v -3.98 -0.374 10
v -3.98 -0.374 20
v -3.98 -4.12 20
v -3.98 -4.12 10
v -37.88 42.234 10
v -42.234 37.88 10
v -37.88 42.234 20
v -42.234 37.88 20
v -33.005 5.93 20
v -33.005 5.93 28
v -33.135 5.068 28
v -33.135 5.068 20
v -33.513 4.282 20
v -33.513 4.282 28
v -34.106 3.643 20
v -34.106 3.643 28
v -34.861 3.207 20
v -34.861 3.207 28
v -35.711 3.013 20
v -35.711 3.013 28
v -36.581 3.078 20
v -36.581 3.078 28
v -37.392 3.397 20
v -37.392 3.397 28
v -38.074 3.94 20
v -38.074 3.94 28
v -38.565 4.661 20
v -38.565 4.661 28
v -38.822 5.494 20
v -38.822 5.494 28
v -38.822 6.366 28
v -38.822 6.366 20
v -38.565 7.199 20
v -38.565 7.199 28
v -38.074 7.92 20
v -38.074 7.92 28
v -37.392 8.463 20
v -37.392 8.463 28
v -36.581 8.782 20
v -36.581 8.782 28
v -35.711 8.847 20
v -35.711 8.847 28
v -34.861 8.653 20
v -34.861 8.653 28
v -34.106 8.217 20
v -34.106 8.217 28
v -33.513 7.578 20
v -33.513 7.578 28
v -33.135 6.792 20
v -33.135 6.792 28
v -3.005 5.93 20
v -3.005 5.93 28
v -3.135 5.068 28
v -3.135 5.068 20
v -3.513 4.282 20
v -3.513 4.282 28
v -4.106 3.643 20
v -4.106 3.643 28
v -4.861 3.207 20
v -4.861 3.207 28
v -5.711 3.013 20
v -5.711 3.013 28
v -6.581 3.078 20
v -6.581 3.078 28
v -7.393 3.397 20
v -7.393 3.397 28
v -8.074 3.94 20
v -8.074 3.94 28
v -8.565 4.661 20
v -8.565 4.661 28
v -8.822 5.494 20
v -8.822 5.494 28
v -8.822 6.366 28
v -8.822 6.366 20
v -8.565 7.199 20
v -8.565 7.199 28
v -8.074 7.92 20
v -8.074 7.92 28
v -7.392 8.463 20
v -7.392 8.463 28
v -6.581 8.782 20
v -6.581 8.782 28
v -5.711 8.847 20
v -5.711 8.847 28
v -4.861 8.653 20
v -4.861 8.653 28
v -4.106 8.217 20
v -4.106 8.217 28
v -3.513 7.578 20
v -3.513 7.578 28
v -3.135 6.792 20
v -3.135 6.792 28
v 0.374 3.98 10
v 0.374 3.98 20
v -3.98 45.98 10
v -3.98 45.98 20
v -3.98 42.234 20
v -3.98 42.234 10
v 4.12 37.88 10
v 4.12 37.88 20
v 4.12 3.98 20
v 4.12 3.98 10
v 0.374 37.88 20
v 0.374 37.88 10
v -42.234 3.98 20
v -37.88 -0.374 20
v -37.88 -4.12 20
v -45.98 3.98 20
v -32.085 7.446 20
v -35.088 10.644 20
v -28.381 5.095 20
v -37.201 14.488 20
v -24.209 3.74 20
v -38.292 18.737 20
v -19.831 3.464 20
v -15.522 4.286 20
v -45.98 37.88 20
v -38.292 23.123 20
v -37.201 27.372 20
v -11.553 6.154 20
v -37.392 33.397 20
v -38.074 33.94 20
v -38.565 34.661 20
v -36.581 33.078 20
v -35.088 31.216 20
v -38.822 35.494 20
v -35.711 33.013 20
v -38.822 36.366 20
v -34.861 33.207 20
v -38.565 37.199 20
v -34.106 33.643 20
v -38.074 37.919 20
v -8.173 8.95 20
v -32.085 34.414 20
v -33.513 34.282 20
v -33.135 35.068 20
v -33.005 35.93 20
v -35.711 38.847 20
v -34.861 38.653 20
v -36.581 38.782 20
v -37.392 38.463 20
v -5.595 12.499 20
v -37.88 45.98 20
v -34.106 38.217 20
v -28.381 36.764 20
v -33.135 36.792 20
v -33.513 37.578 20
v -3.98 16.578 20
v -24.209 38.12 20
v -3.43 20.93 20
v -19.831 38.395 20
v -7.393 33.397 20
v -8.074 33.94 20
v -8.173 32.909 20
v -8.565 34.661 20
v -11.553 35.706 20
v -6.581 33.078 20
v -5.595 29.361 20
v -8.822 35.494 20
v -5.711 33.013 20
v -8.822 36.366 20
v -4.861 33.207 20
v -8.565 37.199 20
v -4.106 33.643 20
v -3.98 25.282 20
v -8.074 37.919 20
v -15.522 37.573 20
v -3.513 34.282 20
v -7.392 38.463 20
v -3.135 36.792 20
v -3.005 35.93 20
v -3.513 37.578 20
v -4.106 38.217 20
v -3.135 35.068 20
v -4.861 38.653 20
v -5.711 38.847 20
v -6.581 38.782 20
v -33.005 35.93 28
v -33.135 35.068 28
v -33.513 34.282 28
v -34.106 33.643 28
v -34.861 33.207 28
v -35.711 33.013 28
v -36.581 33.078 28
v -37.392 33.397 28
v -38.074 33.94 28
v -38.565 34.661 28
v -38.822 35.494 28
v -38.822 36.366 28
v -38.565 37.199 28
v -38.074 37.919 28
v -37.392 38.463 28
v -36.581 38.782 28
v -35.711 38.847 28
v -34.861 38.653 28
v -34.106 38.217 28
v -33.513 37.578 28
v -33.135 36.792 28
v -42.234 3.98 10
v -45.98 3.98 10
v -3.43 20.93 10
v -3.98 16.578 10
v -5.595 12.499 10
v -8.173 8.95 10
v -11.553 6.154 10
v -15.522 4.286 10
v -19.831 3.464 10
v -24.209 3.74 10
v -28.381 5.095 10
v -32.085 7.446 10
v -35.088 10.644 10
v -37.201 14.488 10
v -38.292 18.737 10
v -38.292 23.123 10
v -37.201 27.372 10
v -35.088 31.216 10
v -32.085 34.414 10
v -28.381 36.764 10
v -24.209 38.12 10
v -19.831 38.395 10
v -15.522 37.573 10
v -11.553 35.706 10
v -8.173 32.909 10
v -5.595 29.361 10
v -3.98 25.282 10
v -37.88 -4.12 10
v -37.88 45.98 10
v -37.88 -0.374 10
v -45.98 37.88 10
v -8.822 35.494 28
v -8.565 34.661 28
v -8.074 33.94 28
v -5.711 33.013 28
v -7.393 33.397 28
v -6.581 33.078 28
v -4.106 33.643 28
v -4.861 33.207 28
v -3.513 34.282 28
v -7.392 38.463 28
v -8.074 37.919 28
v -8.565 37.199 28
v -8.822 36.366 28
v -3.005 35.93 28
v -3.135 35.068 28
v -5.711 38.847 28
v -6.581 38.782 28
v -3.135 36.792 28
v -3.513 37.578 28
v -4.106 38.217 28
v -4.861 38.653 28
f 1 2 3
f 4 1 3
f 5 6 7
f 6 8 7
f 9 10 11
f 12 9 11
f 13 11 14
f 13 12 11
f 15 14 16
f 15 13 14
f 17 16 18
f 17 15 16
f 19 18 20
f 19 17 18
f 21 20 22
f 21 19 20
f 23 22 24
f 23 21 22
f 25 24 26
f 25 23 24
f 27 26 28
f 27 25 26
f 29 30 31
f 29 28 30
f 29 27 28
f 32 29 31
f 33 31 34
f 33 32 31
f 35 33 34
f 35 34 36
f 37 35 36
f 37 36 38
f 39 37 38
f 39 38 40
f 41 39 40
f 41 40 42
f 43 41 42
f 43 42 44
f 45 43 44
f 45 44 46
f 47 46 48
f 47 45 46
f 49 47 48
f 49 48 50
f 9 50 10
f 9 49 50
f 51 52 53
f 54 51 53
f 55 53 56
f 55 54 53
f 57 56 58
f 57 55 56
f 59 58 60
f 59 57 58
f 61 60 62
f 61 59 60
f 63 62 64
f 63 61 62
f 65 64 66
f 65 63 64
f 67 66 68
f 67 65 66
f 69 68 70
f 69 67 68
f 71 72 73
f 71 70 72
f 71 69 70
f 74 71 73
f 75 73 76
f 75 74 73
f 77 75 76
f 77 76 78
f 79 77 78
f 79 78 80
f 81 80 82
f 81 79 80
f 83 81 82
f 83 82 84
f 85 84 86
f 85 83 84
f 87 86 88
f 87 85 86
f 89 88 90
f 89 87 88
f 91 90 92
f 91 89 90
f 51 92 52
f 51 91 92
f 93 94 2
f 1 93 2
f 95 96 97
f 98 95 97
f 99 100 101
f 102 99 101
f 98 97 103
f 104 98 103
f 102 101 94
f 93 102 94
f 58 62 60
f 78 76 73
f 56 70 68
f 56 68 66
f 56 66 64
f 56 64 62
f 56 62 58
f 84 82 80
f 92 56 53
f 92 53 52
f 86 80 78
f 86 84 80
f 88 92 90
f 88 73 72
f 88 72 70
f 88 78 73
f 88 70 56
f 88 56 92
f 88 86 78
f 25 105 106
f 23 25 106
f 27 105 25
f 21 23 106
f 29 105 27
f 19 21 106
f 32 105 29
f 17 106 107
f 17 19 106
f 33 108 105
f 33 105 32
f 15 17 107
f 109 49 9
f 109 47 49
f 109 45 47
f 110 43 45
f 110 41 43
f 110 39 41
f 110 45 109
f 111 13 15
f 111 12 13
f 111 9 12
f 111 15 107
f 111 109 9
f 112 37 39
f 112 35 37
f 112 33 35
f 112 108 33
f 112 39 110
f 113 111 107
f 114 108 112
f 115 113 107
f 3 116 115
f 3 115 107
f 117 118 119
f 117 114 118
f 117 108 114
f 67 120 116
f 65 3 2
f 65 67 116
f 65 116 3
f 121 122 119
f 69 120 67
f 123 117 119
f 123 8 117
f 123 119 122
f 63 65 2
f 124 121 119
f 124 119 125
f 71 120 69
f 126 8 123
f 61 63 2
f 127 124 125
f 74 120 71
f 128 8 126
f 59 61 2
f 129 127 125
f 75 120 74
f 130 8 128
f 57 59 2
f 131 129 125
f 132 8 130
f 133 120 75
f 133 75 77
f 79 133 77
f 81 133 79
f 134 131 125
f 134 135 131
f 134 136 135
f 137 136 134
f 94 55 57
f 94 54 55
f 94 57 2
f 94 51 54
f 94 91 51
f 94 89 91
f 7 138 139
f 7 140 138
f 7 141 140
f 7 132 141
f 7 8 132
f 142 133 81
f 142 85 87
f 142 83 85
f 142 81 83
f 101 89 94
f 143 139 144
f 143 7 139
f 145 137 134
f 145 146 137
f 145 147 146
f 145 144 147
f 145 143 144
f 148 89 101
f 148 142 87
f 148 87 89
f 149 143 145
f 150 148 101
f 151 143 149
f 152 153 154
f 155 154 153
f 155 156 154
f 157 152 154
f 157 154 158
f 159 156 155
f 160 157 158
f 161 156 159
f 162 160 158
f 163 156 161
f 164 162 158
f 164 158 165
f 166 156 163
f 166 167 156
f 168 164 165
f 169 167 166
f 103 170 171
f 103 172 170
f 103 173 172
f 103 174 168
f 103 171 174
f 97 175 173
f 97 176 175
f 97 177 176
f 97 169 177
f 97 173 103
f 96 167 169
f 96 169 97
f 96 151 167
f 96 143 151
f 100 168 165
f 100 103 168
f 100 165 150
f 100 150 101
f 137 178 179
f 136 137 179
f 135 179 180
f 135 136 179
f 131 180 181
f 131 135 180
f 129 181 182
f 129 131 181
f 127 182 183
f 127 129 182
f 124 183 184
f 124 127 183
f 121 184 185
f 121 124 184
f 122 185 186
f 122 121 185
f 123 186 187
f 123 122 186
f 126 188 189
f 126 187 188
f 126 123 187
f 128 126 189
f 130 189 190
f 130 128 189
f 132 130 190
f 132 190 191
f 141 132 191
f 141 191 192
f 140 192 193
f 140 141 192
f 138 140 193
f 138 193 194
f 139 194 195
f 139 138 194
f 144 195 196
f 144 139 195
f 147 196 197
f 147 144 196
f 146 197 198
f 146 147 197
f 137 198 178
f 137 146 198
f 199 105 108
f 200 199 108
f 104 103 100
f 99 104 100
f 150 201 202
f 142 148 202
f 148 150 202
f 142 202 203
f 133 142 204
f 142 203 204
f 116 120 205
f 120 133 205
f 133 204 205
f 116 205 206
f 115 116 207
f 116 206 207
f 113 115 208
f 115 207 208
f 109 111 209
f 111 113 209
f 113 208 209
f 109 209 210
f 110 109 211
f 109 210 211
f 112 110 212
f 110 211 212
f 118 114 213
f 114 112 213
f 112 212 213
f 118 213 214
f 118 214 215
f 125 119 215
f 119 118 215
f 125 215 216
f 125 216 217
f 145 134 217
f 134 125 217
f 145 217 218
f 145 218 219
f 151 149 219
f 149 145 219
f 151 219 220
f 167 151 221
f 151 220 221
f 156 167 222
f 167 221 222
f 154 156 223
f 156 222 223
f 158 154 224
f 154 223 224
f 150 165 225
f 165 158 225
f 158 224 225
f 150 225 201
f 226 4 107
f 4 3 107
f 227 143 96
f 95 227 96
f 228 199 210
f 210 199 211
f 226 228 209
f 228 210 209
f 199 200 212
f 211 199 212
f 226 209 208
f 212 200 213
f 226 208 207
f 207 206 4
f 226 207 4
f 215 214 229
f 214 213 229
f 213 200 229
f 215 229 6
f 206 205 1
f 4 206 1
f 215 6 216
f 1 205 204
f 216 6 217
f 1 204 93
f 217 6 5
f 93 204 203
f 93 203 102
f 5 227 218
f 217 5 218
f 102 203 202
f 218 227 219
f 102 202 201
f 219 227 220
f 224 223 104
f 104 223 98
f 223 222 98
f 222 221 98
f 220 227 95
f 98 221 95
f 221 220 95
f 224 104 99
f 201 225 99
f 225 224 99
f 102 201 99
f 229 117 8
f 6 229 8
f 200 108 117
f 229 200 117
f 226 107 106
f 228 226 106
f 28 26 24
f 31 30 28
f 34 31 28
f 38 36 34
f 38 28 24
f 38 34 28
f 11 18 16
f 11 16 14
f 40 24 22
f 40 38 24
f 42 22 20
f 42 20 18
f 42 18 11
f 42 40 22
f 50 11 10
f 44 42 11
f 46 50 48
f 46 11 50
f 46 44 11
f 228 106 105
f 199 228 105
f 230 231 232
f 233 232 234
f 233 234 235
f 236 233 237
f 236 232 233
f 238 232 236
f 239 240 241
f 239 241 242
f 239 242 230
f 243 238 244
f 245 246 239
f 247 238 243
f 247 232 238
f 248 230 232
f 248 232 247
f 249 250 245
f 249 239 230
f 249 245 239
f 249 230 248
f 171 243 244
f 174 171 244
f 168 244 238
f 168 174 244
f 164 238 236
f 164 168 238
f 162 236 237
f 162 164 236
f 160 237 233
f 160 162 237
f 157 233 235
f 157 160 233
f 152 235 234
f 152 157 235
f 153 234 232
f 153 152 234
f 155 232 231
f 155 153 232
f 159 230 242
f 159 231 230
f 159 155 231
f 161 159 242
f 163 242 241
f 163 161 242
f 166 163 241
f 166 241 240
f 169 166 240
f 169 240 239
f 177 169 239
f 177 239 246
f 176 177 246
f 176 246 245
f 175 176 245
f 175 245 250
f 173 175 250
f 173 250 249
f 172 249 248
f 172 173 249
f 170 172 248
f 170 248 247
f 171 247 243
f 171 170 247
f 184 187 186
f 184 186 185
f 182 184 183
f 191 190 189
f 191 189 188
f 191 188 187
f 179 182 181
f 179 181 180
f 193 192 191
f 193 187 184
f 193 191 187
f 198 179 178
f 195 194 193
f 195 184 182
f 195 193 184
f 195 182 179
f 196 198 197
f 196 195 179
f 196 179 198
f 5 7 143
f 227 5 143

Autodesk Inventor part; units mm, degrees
ref_plane "YZ Plane" through (0, 0, 0) normal (1, 0, 0) x (0, 1, 0)
ref_plane "XZ Plane" through (0, 0, 0) normal (0, 1, 0) x (-1, 0, 0)
ref_plane "Work Plane1" through (0, 0, 10) normal (0, 0, 1) x (1, 0, 0)
sketch "Sketch1" plane through (0, 0, 10) normal (0, 0, 1) x (1, 0, 0)
  line L0 (-4.0299, -0.3538) -> (-2.2322, 1.4439) construction
  arc A0 (-1.4439, 2.2322) -> (-2.2322, 1.4439) centre (-0.9299, 0.9299) ccw construction
  line L1 (-1.4439, 2.2322) -> (0.3538, 4.0299) construction
  line L2 (-37.8299, 42.8299) -> (-37.8299, 37.8299) construction
  line L3 (-37.8299, 37.8299) -> (-42.9208, 37.8299) construction
  line L4 (-37.8299, 42.2137) -> (-37.8299, 45.8299) construction
  line L5 (-37.8299, 45.8299) -> (-4.0299, 45.8299) construction
  line L6 (-4.0299, 45.8299) -> (-4.0299, 42.2137) construction
  line L7 (-4.0299, 4.0299) -> (0.3538, 4.0299) projected
  circle A1 centre (-20.9299, 20.9299) radius 17.5 projected
  line L8 (-20.9299, 58.9723) -> (17.1124, 20.9299) construction
  line L9 (17.1124, 20.9299) -> (-20.9299, -17.1124) construction
  line L10 (-20.9299, -17.1124) -> (-58.9723, 20.9299) construction
  line L11 (-58.9723, 20.9299) -> (-20.9299, 58.9723) construction
  line L12 (-20.9299, 58.9723) -> (-20.9299, -17.1124) construction
  line L13 (17.1124, 20.9299) -> (-58.9723, 20.9299) construction
  line L14 (-20.9299, 58.9723) -> (32.8701, 58.9723) construction
  line L15 (-43.4299, 43.4299) -> (1.5701, 43.4299) construction
  line L16 (1.5701, 43.4299) -> (1.5701, -1.5701) construction
  line L17 (1.5701, -1.5701) -> (-43.4299, -1.5701) construction
  line L18 (-43.4299, -1.5701) -> (-43.4299, 43.4299) construction
  line L19 (-43.4299, 43.4299) -> (1.5701, -1.5701) construction
  line L20 (1.5701, 43.4299) -> (-43.4299, -1.5701) construction
  line L21 (-43.4299, 5.3876) -> (-43.4299, 36.4723)
  line L22 (-43.4299, 36.4723) -> (-36.4723, 43.4299)
  line L23 (-36.4723, 43.4299) -> (-5.3876, 43.4299)
  line L24 (-5.3876, 43.4299) -> (1.5701, 36.4723)
  line L25 (1.5701, 36.4723) -> (1.5701, 5.3876)
  line L26 (1.5701, 5.3876) -> (-5.3876, -1.5701)
  line L27 (-5.3876, -1.5701) -> (-36.4723, -1.5701)
  line L28 (-36.4723, -1.5701) -> (-43.4299, 5.3876)
  line L29 (-4.0299, 42.2137) -> (-37.8299, 42.2137) projected
  line L30 (-4.0299, -0.3538) -> (-4.0299, 4.0299) projected
  point P0 (-37.8299, 4.0299)
  point P1 (-20.9299, 20.9299)
  dimension "d18" = 53.8
  dimension "d19" = 45
  dimension "d20" = 53.8
  dimension "d21" = 45
  dimension "d22" = 45
extrude "Extrusion1" add sketch "Sketch1" along normal blind 10
sketch "Sketch2" plane through (0, 0, 20) normal (0, 0, 1) x (1, 0, 0)
  circle A0 centre (-35.9299, 35.9299) radius 3.0099 construction
  circle A1 centre (-5.93, 35.9299) radius 3.0099 construction
  circle A2 centre (-5.93, 5.93) radius 3.0099 construction
  circle A3 centre (-35.9299, 5.93) radius 3.0099 construction
  circle A4 centre (-35.9299, 35.9299) radius 2.925
  circle A5 centre (-5.93, 35.9299) radius 2.925
  circle A6 centre (-5.93, 5.93) radius 2.925
  circle A7 centre (-35.9299, 5.93) radius 2.925
  point P0 (0, 0)
  dimension "d1" = 5.85
  dimension "d31" = 5.85
  dimension "d32" = 5.85
  dimension "d33" = 5.85
ref_plane "Work Plane2" through (-40.9959, 0.8639, 22.2359) normal (0, 0, 1) x (1, 0, 0)
extrude "Extrusion2" add sketch "Sketch2" along normal blind 8
sketch "Sketch3" plane through (0, 0, 10) normal (0, 0, -1) x (-1, 0, 0)
  line L0 (37.8299, -0.4701) -> (37.8299, 4.0299) construction
  line L1 (4.0299, 4.0299) -> (4.0299, -0.4701) construction
  line L2 (37.8299, -0.4701) -> (37.8299, 1.1886) construction
  line L3 (4.0299, -3.9701) -> (4.0299, -0.3538) construction
  line L4 (45.8299, 4.0299) -> (42.2137, 4.0299) construction
  line L5 (-0.3538, 4.0299) -> (-3.9701, 4.0299) construction
  line L6 (-3.9701, 37.8299) -> (-0.3538, 37.8299) construction
  line L7 (4.0299, 42.2137) -> (4.0299, 45.8299) construction
  line L8 (37.8299, 45.8299) -> (37.8299, 42.2137) construction
  line L9 (42.2137, 37.8299) -> (45.8299, 37.8299) construction
  line L10 (40.4657, 37.7299) -> (45.8299, 37.7299)
  line L11 (45.8299, 37.7299) -> (45.8299, 4.1299)
  line L12 (45.8299, 4.1299) -> (40.4657, 4.1299)
  line L13 (40.4657, 4.1299) -> (40.4657, 37.7299)
  line L14 (37.7299, 2.4952) -> (4.1299, 2.4952)
  line L15 (4.1299, 2.4952) -> (4.1299, -3.9701)
  line L16 (4.1299, -3.9701) -> (37.7299, -3.9701)
  line L17 (37.7299, -3.9701) -> (37.7299, 2.4952)
  line L18 (1.8946, 4.1299) -> (-3.9701, 4.1299)
  line L19 (-3.9701, 4.1299) -> (-3.9701, 37.7299)
  line L20 (-3.9701, 37.7299) -> (1.8946, 37.7299)
  line L21 (1.8946, 37.7299) -> (1.8946, 4.1299)
  line L22 (4.1299, 40.7326) -> (37.7299, 40.7326)
  line L23 (37.7299, 40.7326) -> (37.7299, 45.8299)
  line L24 (37.7299, 45.8299) -> (4.1299, 45.8299)
  line L25 (4.1299, 45.8299) -> (4.1299, 40.7326)
  point P0 (0, 0)
  dimension "d23" = 0.1
  dimension "d24" = 0.1
  dimension "d25" = 0.1
  dimension "d26" = 0.1
  dimension "d27" = 0.1
extrude "Extrusion3" add sketch "Sketch3" against normal up to surface (10 mm away)
sketch "Sketch4" plane through (0, 0, 20) normal (0, 0, 1) x (1, 0, 0)
  line L0 (3.9701, 4.1299) -> (0.3124, 4.1299) projected
  line L1 (3.9701, 37.7299) -> (3.9701, 4.1299) projected
  line L2 (0.3124, 37.7299) -> (3.9701, 37.7299) projected
  line L3 (0.3124, 37.7299) -> (-4.1299, 42.1723) projected
  line L4 (-4.1299, 45.8299) -> (-4.1299, 42.1723) projected
  line L5 (-37.7299, 45.8299) -> (-4.1299, 45.8299) projected
  line L6 (-37.7299, 42.1723) -> (-37.7299, 45.8299) projected
  line L7 (-37.7299, 42.1723) -> (-42.1723, 37.7299) projected
  line L8 (-45.8299, 37.7299) -> (-42.1723, 37.7299) projected
  line L9 (-45.8299, 4.1299) -> (-45.8299, 37.7299) projected
  line L10 (-42.1723, 4.1299) -> (-45.8299, 4.1299) projected
  line L11 (-42.1723, 4.1299) -> (-37.7299, -0.3124) projected
  line L12 (-37.7299, -3.9701) -> (-37.7299, -0.3124) projected
  line L13 (-4.1299, -3.9701) -> (-37.7299, -3.9701) projected
  line L14 (-4.1299, -0.3124) -> (-4.1299, -3.9701) projected
  line L15 (-4.1299, -0.3124) -> (0.3124, 4.1299) projected
  circle A0 centre (-20.9299, 20.9299) radius 17.5 projected
  circle A1 centre (-35.9299, 5.93) radius 2.925 projected
  circle A2 centre (-5.93, 35.9299) radius 2.925 projected
  circle A3 centre (-35.9299, 35.9299) radius 2.925 projected
  circle A4 centre (-5.93, 5.93) radius 2.925 projected
  line L16 (-3.9799, 45.9799) -> (-3.9799, 42.2344)
  line L17 (-3.9799, 42.2344) -> (0.3745, 37.8799)
  line L18 (0.3745, 37.8799) -> (4.1201, 37.8799)
  line L19 (4.1201, 37.8799) -> (4.1201, 3.9799)
  line L20 (4.1201, 3.9799) -> (0.3745, 3.9799)
  line L21 (0.3745, 3.9799) -> (-3.9799, -0.3745)
  line L22 (-3.9799, -0.3745) -> (-3.9799, -4.1201)
  line L23 (-3.9799, -4.1201) -> (-37.8799, -4.1201)
  line L24 (-37.8799, -4.1201) -> (-37.8799, -0.3745)
  line L25 (-37.8799, -0.3745) -> (-42.2344, 3.9799)
  line L26 (-42.2344, 3.9799) -> (-45.9799, 3.9799)
  line L27 (-45.9799, 3.9799) -> (-45.9799, 37.8799)
  line L28 (-45.9799, 37.8799) -> (-42.2344, 37.8799)
  line L29 (-42.2344, 37.8799) -> (-37.8799, 42.2344)
  line L30 (-37.8799, 42.2344) -> (-37.8799, 45.9799)
  line L31 (-37.8799, 45.9799) -> (-3.9799, 45.9799)
  point P0 (0, 0)
  dimension "d34" = 0.15
extrude "Extrusion4" add sketch "Sketch4" against normal up to surface (10 mm away) contours L16 L17 L18 L19 L20 L21 L22 L23 L24 L25 L26 L27 L28 L29 L30 L31
ref_plane "Arbeitsebene3" through (-37.8799, 20.9299, 20) normal (0, -1, 0) x (1, 0, 0)
ref_plane "Arbeitsebene4" through (-20.9299, 3.9799, 20) normal (1, 0, 0) x (0, 0, -1)
equation "\"d31\" = d1"
equation "\"d32\" = d1"
equation "\"d33\" = d1"
properties part number "20_Cube_Insert_Thorlabs_Pins"
